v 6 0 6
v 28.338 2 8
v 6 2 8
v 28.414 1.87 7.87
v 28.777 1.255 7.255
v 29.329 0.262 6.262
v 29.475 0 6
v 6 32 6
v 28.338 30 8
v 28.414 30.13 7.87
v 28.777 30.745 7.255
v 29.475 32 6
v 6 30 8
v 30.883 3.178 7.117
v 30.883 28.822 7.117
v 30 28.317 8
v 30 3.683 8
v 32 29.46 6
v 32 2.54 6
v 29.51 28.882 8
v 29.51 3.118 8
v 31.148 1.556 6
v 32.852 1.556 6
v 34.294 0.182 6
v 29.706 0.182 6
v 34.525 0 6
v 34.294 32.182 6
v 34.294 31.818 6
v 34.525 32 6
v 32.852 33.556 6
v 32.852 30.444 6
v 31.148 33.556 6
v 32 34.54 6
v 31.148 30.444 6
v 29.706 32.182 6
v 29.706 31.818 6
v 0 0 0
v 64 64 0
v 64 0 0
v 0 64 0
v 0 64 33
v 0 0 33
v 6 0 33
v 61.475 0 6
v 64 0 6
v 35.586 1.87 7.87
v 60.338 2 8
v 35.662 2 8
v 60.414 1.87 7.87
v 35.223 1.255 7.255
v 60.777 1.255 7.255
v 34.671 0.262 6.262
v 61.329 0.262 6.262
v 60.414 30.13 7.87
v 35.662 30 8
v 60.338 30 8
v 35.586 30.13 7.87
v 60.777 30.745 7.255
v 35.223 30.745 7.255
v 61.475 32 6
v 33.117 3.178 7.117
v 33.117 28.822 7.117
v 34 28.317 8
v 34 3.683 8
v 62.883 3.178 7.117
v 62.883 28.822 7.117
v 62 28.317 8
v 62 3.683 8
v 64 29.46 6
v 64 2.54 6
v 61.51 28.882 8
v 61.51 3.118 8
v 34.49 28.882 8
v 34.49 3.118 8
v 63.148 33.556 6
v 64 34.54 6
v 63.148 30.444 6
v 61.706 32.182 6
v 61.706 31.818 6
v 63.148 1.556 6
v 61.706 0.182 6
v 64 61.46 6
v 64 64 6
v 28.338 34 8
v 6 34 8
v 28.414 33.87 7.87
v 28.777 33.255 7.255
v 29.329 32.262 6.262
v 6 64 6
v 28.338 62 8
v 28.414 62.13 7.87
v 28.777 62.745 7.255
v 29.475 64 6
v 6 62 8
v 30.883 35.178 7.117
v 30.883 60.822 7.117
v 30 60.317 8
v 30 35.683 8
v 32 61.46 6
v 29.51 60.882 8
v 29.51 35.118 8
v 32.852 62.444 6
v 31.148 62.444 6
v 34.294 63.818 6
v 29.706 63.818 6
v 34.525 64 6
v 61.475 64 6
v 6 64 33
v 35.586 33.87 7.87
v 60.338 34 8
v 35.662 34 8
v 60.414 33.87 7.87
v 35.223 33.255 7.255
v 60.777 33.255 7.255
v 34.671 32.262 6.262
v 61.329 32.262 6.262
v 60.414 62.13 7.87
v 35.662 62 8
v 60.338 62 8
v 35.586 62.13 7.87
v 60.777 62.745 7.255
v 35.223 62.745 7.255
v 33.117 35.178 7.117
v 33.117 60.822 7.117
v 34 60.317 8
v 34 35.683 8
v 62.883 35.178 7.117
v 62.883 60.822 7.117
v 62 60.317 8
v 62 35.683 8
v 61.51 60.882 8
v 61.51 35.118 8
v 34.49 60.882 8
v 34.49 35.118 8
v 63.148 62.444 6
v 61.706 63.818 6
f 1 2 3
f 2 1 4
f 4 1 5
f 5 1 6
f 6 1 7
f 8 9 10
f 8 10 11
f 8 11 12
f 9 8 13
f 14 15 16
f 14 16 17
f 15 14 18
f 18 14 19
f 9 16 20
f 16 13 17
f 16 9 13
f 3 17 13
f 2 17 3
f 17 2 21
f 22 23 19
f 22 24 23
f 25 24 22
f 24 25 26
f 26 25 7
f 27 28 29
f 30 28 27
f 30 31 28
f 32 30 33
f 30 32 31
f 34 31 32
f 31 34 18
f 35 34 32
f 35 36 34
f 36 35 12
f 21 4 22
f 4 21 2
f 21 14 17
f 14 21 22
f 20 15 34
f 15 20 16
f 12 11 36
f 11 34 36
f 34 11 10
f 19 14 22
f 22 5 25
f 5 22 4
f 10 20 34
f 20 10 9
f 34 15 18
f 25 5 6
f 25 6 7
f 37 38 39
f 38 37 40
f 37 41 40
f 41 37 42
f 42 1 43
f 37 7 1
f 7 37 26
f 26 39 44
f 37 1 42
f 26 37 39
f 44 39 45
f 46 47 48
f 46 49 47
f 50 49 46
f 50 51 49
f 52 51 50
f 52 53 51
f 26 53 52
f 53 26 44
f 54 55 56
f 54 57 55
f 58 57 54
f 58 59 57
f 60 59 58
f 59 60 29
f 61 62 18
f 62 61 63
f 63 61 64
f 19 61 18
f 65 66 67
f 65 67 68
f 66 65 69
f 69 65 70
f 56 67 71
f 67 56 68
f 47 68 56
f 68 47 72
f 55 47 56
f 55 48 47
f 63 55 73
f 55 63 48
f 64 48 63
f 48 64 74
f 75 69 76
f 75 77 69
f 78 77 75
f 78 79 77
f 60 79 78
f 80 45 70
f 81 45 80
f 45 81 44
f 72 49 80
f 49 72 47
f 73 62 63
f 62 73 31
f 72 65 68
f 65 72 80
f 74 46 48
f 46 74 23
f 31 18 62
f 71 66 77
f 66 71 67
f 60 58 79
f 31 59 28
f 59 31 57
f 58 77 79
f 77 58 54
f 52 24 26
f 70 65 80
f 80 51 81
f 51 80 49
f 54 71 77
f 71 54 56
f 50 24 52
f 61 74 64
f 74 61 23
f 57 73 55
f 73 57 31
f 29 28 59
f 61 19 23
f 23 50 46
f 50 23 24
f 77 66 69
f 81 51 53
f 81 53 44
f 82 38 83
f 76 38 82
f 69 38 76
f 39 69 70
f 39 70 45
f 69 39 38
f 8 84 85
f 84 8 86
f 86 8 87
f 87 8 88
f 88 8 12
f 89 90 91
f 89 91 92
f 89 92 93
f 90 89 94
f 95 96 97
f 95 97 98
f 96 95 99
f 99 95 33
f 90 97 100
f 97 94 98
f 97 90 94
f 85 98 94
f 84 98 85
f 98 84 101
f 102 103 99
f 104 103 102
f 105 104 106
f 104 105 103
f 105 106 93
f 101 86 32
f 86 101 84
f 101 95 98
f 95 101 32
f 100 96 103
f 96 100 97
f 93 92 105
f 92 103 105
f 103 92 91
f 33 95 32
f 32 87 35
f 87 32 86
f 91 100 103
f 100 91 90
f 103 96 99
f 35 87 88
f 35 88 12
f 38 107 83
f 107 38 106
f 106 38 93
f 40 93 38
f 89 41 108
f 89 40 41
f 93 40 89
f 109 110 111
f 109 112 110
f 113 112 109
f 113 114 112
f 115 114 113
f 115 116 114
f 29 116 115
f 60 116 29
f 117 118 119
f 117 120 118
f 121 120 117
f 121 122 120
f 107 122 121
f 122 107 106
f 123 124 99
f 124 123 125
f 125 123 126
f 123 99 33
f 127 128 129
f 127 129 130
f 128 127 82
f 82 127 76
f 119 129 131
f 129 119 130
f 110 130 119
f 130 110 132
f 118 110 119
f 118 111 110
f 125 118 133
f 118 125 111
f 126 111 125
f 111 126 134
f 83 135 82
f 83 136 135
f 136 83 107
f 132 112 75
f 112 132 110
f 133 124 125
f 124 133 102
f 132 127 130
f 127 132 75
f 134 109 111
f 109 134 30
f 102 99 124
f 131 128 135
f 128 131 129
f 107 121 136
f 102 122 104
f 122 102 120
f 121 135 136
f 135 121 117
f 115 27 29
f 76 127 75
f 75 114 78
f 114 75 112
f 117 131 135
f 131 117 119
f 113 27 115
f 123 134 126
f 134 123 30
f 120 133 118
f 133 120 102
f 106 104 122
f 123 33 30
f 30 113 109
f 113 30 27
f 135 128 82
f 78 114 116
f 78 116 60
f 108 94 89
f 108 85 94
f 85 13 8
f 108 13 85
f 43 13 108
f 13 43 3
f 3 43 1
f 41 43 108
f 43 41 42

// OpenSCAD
// file: WylochStyleDungeonLibrary.scad
size = 32;
baseheight = 6;
topperheight = 2;
topperrounded = true;
walllength = size;
wallheight = 25 + baseheight + topperheight;
wallwidth = 6;
wallwidththin = 4;

function hypotenuse_ra(side_a, side_b) =
    sqrt(pow(side_a, 2) + pow(side_b, 2));
    
module wsdl_Base(s,bh)
{
    cube([s,s,bh]);
}

module wsdl_Topper(s,bh,th,tr)
{
    if (tr) {
        translate([0,0,bh])
            intersection() {
                difference () {
                        cube([s,s,th]);
                        union () {
                        rotate(a=45, v=[1,0,0])
                            cube([s,th*2,th*2]);
                        translate([0,s,0])
                            rotate(a=45, v=[1,0,0])
                                cube([s,th*2,th*2]);
                        rotate(a=-45, v=[0,1,0])
                            cube([th*2,s,th*2]);
                        translate([s,0,0])
                            rotate(a=-45, v=[0,1,0])
                                cube([th*2,s,th*2]);
                        }
                }
                translate([s/2,s/2,0])
                    cylinder(
                        h=th, 
                        r1=hypotenuse_ra(s/2-1.2, s/2-1.2), 
                        r2=hypotenuse_ra(s/2-th-.8, s/2-th-.8), 
                        center=false, 
                        $fa=.1);
            }    
    }
    else {
        translate([0,0,bh])
            difference() {
                cube([s,s,th]);
                union () {
                rotate(a=45, v=[1,0,0])
                    cube([s,th*2,th*2]);
                translate([0,s,0])
                    rotate(a=45, v=[1,0,0])
                        cube([s,th*2,th*2]);
                rotate(a=-45, v=[0,1,0])
                    cube([th*2,s,th*2]);
                translate([s,0,0])
                    rotate(a=-45, v=[0,1,0])
                        cube([th*2,s,th*2]);
                }
            }    
    }
}

module wsdl_Base_1x1(s,bh,th,tr) 
{
    union () {
        wsdl_Base(s,bh);
        wsdl_Topper(s,bh,th,tr);
    }
}

module wsdl_Base_1x2(s,bh,th,tr)
{
    union () {
        wsdl_Base_1x1(s,bh,th,tr);
        translate([s,0,0])
            wsdl_Base_1x1(s,bh,th,tr);
    }
}
 
module wsdl_Base_2x2(s,bh,th,tr)
{
    union () {
        wsdl_Base_1x2(s,bh,th,tr);
        translate([0,s,0])
            wsdl_Base_1x2(s,bh,th,tr);
    }
}
 
module wsdl_Base_2x4(s,bh,th,tr)
{
    union () {
        wsdl_Base_2x2(s,bh,th,tr);
        translate([s*2,0,0])
            wsdl_Base_2x2(s,bh,th,tr);
    }
}
 
module wsdl_Base_4x4(s,bh,th,tr)
{
    union () {
        wsdl_Base_2x4(s,bh,th,tr);
        translate([0,s*2,0])
            wsdl_Base_2x4(s,bh,th,tr);
    }
}
 
module wsdl_Wall_1(w,l,h)
{
    cube([w,l,h]);   
}

module wsdl_Wall_2(w,l,h)
{
    union() {
        wsdl_Wall_1(w,l,h);
        translate([0,l,0])
            wsdl_Wall_1(w,l,h);
    }
}

module wsdl_Wall_1_Left(w,l,h) 
{
    wsdl_Wall_1(w,l,h);
}

module wsdl_Wall_1_Right(w,l,h) 
{
    translate([(size)-w,0,0])
        wsdl_Wall_1(w,l,h);
}

module wsdl_Wall_1_DoubleRight(w,l,h) 
{
    translate([(size*2)-w,0,0])
        wsdl_Wall_1(w,l,h);
}

module wsdl_Wall_1_Bottom(w,l,h) 
{
rotate(a=-90)
    translate([-w,0,0])
        wsdl_Wall_1(w,l,h);

}

module wsdl_Wall_1_Top(w,l,h) 
{
rotate(a=-90)
    translate([-l,0,0])
        wsdl_Wall_1(w,l,h);

}

module wsdl_Wall_1_Center(w,l,h) 
{
    translate([(size)-w/2,0,0])
        wsdl_Wall_1(w,l,h);
}


module wsdl_Wall_2_Left(w,l,h) 
{
    wsdl_Wall_2(w,l,h);
}

module wsdl_Wall_2_Right(w,l,h) 
{
    translate([(size*2)-w,0,0])
        wsdl_Wall_2(w,l,h);
}

module wsdl_Wall_2_Bottom(w,l,h) 
{
rotate(a=-90)
    translate([-w,0,0])
        wsdl_Wall_2(w,l,h);

}

module wsdl_Wall_2_Top(w,l,h) 
{
rotate(a=-90)
    translate([-l*2,0,0])
        wsdl_Wall_2(w,l,h);

}

module wsdl_Wall_2_Center(w,l,h) 
{
    translate([(size)-w/2,0,0])
        wsdl_Wall_2(w,l,h);
}
// main file
include <WylochStyleDungeonLibrary.scad>; 
 
wsdl_Base_2x2(size,baseheight,topperheight,topperrounded);
wsdl_Wall_2_Left(wallwidth,walllength,wallheight);
